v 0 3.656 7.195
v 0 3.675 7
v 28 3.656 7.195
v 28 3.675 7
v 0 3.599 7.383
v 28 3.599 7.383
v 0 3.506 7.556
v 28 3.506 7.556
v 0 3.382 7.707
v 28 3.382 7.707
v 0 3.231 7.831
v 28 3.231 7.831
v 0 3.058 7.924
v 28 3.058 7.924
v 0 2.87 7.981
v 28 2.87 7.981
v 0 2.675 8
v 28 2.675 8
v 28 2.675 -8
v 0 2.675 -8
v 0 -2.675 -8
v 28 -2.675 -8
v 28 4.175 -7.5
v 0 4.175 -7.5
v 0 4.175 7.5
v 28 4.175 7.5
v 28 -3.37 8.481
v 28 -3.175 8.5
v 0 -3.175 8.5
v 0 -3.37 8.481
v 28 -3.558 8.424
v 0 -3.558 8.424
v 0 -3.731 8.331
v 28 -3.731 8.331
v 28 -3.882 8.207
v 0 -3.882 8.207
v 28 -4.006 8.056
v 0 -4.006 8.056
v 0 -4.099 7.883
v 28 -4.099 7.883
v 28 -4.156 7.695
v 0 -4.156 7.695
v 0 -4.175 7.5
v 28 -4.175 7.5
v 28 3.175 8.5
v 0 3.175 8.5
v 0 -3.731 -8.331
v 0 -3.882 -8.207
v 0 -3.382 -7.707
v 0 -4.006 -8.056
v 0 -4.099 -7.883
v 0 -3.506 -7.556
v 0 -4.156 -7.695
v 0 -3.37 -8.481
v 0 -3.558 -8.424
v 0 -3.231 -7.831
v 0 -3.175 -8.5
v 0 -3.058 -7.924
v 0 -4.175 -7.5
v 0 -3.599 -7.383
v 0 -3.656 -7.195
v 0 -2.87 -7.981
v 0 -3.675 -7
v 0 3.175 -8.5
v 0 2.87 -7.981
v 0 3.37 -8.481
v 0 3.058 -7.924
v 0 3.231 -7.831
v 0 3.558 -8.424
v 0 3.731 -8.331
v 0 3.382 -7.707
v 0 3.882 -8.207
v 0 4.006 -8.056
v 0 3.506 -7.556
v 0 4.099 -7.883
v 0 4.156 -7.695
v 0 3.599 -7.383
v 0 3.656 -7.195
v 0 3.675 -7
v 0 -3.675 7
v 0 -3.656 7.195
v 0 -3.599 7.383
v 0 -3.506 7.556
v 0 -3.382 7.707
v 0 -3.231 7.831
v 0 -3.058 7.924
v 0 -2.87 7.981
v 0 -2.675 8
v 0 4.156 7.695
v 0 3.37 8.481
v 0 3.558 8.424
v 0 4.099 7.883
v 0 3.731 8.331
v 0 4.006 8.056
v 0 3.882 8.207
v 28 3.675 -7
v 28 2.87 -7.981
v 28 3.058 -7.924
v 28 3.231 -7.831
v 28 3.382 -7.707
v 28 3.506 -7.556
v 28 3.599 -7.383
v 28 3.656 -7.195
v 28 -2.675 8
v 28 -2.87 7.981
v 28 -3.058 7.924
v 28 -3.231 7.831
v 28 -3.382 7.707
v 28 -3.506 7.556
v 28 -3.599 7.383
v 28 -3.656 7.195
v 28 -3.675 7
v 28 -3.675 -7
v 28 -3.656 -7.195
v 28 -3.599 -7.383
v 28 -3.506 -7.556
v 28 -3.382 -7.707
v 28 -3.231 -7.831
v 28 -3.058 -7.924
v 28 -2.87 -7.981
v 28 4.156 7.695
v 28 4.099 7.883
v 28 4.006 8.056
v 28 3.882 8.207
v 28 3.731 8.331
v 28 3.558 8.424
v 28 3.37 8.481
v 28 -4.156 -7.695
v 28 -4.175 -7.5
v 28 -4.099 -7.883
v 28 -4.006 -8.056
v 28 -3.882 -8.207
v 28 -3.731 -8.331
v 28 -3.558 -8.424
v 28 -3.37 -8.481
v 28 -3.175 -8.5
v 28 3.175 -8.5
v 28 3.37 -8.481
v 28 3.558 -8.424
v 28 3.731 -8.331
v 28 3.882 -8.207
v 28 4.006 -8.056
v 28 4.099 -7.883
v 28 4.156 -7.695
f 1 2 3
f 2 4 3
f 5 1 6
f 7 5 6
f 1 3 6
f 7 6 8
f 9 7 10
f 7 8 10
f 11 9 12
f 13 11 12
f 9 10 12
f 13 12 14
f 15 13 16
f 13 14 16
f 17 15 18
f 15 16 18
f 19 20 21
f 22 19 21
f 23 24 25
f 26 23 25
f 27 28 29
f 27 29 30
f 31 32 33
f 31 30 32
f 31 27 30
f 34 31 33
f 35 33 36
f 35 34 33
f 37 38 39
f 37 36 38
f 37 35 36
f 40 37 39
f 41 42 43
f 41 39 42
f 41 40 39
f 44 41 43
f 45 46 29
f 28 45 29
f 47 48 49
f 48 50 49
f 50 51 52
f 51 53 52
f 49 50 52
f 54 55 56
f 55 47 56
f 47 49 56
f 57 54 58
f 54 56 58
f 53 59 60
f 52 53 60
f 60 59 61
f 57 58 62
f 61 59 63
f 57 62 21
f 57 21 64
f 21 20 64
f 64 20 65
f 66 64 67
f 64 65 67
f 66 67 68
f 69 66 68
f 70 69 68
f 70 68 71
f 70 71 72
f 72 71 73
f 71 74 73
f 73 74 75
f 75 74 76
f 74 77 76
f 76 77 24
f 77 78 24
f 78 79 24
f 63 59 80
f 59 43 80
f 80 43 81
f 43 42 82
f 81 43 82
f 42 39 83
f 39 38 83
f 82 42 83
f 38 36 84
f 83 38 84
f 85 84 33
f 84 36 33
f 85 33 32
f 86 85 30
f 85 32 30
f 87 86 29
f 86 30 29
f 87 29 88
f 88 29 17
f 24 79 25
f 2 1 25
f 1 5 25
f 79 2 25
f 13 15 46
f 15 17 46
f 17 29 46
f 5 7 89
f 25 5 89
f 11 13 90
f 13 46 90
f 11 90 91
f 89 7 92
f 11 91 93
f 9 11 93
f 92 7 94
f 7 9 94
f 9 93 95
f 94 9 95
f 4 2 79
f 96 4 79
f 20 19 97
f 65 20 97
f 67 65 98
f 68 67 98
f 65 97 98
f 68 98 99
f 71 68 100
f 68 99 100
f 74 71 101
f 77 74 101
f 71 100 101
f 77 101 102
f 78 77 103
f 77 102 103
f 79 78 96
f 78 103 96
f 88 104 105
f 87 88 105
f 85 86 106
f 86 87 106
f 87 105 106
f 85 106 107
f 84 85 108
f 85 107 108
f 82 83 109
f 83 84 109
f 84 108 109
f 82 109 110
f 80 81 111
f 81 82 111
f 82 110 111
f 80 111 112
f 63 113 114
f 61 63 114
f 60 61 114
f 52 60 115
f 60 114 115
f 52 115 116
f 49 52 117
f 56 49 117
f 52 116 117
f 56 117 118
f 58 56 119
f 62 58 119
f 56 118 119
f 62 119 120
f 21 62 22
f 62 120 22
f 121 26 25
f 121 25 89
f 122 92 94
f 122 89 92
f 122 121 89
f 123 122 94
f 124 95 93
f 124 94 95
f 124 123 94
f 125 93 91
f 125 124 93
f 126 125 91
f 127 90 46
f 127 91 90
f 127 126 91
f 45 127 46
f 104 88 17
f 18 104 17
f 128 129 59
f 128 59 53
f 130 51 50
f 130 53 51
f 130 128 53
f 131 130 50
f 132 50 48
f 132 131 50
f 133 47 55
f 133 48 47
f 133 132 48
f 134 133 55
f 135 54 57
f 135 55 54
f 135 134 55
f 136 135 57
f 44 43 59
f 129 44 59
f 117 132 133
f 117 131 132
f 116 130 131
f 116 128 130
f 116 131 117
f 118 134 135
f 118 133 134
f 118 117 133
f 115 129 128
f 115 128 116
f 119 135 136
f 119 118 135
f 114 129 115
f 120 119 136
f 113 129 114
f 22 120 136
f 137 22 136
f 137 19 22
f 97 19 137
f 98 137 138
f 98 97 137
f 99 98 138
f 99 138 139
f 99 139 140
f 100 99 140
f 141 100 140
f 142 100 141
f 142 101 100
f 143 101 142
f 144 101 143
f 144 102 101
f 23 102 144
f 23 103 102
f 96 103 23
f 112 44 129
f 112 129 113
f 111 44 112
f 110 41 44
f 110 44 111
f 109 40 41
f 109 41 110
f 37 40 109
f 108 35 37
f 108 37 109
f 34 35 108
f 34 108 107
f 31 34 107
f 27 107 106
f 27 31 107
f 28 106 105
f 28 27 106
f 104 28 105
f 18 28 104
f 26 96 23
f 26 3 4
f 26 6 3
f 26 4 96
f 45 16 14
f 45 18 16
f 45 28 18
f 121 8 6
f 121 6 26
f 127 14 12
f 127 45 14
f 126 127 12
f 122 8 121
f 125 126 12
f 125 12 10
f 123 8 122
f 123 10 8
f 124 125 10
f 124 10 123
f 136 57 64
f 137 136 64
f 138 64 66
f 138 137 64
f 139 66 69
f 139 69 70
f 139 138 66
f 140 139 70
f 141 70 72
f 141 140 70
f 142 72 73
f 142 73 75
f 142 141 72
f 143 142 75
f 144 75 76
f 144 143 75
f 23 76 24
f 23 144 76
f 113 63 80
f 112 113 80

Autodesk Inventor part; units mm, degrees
ref_plane "YZ Plane" through (0, 0, 0) normal (1, 0, 0) x (0, 1, 0)
ref_plane "XZ Plane" through (0, 0, 0) normal (0, 1, 0) x (-1, 0, 0)
ref_plane "XY Plane" through (0, 0, 0) normal (0, 0, 1) x (1, 0, 0)
sketch "Sketch1" plane through (0, 0, 0) normal (1, 0, 0) x (0, 1, 0)
  line L0 (-3.675, 8) -> (3.675, 8)
  line L1 (3.675, 8) -> (3.675, -8)
  line L2 (3.675, -8) -> (-3.675, -8)
  line L3 (-3.675, -8) -> (-3.675, 8)
  line L4 (-3.675, 8) -> (3.675, -8) construction
  line L5 (3.675, 8) -> (-3.675, -8) construction
  line L6 (4.175, -8.5) -> (4.175, 8.5)
  line L7 (4.175, 8.5) -> (-4.175, 8.5)
  line L8 (-4.175, 8.5) -> (-4.175, -8.5)
  line L9 (-4.175, -8.5) -> (4.175, -8.5)
  point P0 (0, 0)
  dimension "d0" = 7.35
  dimension "d1" = 16
  dimension "d2" = 0.5
extrude "Extrusion1" add sketch "Sketch1" along normal blind 28
fillet "Fillet1" radius 1 8 edges at (14, -3.675, -8) (14, 3.675, -8) (14, 4.175, -8.5) (14, 4.175, 8.5) (14, 3.675, 8) (14, -4.175, -8.5) (14, -3.675, 8) (14, -4.175, 8.5)
properties part number "HeatShrink" material "Rubber, Silicone"
